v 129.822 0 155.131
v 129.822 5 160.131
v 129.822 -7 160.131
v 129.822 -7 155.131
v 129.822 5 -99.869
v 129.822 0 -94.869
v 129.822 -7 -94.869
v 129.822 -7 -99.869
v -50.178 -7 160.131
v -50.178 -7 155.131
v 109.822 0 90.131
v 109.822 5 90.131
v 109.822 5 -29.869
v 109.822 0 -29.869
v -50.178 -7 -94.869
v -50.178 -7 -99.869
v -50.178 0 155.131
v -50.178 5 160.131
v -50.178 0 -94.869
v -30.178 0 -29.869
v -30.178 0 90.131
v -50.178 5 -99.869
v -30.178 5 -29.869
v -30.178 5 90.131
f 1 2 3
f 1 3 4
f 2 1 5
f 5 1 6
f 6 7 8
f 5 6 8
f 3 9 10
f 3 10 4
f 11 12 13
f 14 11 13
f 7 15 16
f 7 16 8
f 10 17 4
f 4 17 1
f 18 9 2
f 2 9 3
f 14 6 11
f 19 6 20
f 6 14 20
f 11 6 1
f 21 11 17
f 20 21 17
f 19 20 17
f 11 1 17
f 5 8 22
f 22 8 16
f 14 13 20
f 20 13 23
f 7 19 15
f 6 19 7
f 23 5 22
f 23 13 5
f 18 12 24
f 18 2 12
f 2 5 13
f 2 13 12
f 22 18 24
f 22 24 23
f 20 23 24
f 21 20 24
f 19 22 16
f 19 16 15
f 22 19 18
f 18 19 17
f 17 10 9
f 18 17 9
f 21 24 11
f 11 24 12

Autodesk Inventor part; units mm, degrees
ref_plane "YZ Plane" through (0, 0, 0) normal (1, 0, 0) x (0, 1, 0)
ref_plane "XZ Plane" through (0, 0, 0) normal (0, 1, 0) x (-1, 0, 0)
ref_plane "XY Plane" through (0, 0, 0) normal (0, 0, 1) x (1, 0, 0)
sketch "Sketch1" plane through (0, 0, 0) normal (0, 1, 0) x (-1, 0, 0)
  line L0 (50.1781, 160.1313) -> (-129.8219, 160.1313)
  line L1 (-129.8219, 160.1313) -> (-129.8219, -99.8687)
  line L2 (-129.8219, -99.8687) -> (50.1781, -99.8687)
  line L3 (50.1781, -99.8687) -> (50.1781, 160.1313)
  point P0 (0, 0)
  dimension "d0" = 260
  dimension "d1" = 180
extrude "Extrusion1" add sketch "Sketch1" along normal blind 5
sketch "Sketch2" plane through (0, 0, 0) normal (0, -1, 0) x (1, 0, 0)
  line L0 (129.8219, 160.1313) -> (129.8219, -99.8687) projected
  line L1 (-50.1781, -99.8687) -> (-50.1781, 160.1313) projected
  line L2 (129.8219, 160.1313) -> (-50.1781, 160.1313)
  line L3 (-50.1781, 160.1313) -> (-50.1781, 155.1313)
  line L4 (-50.1781, 155.1313) -> (129.8219, 155.1313)
  line L5 (129.8219, 155.1313) -> (129.8219, 160.1313)
  line L6 (129.8219, -99.8687) -> (-50.1781, -99.8687)
  line L7 (-50.1781, -99.8687) -> (-50.1781, -94.8687)
  line L8 (-50.1781, -94.8687) -> (129.8219, -94.8687)
  line L9 (129.8219, -94.8687) -> (129.8219, -99.8687)
  point P0 (0, 0)
  point P1 (129.8219, 155.1313)
  dimension "d4" = 5
  dimension "d5" = 5
extrude "Extrusion2" add sketch "Sketch2" along normal blind 7 contours L0 L4 L1 L2 | L0 L6 L1 L8
sketch "Sketch3" plane through (0, 5, 0) normal (0, 1, 0) x (1, 0, 0)
  line L0 (109.8219, 29.8687) -> (-30.1781, 29.8687)
  line L1 (-30.1781, 29.8687) -> (-30.1781, -90.1313)
  line L2 (-30.1781, -90.1313) -> (109.8219, -90.1313)
  line L3 (109.8219, -90.1313) -> (109.8219, 29.8687)
  line L4 (129.8219, -160.1313) -> (129.8219, 99.8687) projected
  line L5 (-50.1781, 99.8687) -> (-50.1781, -160.1313) projected
  line L6 (-50.1781, -160.1313) -> (129.8219, -160.1313) projected
  line L7 (129.8219, 99.8687) -> (-50.1781, 99.8687) projected
  point P0 (0, 0)
  dimension "d8" = 20
  dimension "d9" = 20
  dimension "d10" = 70
  dimension "d11" = 70
extrude "Extrusion3" cut sketch "Sketch3" against normal through all contours L3 L2 L1 L0
properties part number "machine_platform"
